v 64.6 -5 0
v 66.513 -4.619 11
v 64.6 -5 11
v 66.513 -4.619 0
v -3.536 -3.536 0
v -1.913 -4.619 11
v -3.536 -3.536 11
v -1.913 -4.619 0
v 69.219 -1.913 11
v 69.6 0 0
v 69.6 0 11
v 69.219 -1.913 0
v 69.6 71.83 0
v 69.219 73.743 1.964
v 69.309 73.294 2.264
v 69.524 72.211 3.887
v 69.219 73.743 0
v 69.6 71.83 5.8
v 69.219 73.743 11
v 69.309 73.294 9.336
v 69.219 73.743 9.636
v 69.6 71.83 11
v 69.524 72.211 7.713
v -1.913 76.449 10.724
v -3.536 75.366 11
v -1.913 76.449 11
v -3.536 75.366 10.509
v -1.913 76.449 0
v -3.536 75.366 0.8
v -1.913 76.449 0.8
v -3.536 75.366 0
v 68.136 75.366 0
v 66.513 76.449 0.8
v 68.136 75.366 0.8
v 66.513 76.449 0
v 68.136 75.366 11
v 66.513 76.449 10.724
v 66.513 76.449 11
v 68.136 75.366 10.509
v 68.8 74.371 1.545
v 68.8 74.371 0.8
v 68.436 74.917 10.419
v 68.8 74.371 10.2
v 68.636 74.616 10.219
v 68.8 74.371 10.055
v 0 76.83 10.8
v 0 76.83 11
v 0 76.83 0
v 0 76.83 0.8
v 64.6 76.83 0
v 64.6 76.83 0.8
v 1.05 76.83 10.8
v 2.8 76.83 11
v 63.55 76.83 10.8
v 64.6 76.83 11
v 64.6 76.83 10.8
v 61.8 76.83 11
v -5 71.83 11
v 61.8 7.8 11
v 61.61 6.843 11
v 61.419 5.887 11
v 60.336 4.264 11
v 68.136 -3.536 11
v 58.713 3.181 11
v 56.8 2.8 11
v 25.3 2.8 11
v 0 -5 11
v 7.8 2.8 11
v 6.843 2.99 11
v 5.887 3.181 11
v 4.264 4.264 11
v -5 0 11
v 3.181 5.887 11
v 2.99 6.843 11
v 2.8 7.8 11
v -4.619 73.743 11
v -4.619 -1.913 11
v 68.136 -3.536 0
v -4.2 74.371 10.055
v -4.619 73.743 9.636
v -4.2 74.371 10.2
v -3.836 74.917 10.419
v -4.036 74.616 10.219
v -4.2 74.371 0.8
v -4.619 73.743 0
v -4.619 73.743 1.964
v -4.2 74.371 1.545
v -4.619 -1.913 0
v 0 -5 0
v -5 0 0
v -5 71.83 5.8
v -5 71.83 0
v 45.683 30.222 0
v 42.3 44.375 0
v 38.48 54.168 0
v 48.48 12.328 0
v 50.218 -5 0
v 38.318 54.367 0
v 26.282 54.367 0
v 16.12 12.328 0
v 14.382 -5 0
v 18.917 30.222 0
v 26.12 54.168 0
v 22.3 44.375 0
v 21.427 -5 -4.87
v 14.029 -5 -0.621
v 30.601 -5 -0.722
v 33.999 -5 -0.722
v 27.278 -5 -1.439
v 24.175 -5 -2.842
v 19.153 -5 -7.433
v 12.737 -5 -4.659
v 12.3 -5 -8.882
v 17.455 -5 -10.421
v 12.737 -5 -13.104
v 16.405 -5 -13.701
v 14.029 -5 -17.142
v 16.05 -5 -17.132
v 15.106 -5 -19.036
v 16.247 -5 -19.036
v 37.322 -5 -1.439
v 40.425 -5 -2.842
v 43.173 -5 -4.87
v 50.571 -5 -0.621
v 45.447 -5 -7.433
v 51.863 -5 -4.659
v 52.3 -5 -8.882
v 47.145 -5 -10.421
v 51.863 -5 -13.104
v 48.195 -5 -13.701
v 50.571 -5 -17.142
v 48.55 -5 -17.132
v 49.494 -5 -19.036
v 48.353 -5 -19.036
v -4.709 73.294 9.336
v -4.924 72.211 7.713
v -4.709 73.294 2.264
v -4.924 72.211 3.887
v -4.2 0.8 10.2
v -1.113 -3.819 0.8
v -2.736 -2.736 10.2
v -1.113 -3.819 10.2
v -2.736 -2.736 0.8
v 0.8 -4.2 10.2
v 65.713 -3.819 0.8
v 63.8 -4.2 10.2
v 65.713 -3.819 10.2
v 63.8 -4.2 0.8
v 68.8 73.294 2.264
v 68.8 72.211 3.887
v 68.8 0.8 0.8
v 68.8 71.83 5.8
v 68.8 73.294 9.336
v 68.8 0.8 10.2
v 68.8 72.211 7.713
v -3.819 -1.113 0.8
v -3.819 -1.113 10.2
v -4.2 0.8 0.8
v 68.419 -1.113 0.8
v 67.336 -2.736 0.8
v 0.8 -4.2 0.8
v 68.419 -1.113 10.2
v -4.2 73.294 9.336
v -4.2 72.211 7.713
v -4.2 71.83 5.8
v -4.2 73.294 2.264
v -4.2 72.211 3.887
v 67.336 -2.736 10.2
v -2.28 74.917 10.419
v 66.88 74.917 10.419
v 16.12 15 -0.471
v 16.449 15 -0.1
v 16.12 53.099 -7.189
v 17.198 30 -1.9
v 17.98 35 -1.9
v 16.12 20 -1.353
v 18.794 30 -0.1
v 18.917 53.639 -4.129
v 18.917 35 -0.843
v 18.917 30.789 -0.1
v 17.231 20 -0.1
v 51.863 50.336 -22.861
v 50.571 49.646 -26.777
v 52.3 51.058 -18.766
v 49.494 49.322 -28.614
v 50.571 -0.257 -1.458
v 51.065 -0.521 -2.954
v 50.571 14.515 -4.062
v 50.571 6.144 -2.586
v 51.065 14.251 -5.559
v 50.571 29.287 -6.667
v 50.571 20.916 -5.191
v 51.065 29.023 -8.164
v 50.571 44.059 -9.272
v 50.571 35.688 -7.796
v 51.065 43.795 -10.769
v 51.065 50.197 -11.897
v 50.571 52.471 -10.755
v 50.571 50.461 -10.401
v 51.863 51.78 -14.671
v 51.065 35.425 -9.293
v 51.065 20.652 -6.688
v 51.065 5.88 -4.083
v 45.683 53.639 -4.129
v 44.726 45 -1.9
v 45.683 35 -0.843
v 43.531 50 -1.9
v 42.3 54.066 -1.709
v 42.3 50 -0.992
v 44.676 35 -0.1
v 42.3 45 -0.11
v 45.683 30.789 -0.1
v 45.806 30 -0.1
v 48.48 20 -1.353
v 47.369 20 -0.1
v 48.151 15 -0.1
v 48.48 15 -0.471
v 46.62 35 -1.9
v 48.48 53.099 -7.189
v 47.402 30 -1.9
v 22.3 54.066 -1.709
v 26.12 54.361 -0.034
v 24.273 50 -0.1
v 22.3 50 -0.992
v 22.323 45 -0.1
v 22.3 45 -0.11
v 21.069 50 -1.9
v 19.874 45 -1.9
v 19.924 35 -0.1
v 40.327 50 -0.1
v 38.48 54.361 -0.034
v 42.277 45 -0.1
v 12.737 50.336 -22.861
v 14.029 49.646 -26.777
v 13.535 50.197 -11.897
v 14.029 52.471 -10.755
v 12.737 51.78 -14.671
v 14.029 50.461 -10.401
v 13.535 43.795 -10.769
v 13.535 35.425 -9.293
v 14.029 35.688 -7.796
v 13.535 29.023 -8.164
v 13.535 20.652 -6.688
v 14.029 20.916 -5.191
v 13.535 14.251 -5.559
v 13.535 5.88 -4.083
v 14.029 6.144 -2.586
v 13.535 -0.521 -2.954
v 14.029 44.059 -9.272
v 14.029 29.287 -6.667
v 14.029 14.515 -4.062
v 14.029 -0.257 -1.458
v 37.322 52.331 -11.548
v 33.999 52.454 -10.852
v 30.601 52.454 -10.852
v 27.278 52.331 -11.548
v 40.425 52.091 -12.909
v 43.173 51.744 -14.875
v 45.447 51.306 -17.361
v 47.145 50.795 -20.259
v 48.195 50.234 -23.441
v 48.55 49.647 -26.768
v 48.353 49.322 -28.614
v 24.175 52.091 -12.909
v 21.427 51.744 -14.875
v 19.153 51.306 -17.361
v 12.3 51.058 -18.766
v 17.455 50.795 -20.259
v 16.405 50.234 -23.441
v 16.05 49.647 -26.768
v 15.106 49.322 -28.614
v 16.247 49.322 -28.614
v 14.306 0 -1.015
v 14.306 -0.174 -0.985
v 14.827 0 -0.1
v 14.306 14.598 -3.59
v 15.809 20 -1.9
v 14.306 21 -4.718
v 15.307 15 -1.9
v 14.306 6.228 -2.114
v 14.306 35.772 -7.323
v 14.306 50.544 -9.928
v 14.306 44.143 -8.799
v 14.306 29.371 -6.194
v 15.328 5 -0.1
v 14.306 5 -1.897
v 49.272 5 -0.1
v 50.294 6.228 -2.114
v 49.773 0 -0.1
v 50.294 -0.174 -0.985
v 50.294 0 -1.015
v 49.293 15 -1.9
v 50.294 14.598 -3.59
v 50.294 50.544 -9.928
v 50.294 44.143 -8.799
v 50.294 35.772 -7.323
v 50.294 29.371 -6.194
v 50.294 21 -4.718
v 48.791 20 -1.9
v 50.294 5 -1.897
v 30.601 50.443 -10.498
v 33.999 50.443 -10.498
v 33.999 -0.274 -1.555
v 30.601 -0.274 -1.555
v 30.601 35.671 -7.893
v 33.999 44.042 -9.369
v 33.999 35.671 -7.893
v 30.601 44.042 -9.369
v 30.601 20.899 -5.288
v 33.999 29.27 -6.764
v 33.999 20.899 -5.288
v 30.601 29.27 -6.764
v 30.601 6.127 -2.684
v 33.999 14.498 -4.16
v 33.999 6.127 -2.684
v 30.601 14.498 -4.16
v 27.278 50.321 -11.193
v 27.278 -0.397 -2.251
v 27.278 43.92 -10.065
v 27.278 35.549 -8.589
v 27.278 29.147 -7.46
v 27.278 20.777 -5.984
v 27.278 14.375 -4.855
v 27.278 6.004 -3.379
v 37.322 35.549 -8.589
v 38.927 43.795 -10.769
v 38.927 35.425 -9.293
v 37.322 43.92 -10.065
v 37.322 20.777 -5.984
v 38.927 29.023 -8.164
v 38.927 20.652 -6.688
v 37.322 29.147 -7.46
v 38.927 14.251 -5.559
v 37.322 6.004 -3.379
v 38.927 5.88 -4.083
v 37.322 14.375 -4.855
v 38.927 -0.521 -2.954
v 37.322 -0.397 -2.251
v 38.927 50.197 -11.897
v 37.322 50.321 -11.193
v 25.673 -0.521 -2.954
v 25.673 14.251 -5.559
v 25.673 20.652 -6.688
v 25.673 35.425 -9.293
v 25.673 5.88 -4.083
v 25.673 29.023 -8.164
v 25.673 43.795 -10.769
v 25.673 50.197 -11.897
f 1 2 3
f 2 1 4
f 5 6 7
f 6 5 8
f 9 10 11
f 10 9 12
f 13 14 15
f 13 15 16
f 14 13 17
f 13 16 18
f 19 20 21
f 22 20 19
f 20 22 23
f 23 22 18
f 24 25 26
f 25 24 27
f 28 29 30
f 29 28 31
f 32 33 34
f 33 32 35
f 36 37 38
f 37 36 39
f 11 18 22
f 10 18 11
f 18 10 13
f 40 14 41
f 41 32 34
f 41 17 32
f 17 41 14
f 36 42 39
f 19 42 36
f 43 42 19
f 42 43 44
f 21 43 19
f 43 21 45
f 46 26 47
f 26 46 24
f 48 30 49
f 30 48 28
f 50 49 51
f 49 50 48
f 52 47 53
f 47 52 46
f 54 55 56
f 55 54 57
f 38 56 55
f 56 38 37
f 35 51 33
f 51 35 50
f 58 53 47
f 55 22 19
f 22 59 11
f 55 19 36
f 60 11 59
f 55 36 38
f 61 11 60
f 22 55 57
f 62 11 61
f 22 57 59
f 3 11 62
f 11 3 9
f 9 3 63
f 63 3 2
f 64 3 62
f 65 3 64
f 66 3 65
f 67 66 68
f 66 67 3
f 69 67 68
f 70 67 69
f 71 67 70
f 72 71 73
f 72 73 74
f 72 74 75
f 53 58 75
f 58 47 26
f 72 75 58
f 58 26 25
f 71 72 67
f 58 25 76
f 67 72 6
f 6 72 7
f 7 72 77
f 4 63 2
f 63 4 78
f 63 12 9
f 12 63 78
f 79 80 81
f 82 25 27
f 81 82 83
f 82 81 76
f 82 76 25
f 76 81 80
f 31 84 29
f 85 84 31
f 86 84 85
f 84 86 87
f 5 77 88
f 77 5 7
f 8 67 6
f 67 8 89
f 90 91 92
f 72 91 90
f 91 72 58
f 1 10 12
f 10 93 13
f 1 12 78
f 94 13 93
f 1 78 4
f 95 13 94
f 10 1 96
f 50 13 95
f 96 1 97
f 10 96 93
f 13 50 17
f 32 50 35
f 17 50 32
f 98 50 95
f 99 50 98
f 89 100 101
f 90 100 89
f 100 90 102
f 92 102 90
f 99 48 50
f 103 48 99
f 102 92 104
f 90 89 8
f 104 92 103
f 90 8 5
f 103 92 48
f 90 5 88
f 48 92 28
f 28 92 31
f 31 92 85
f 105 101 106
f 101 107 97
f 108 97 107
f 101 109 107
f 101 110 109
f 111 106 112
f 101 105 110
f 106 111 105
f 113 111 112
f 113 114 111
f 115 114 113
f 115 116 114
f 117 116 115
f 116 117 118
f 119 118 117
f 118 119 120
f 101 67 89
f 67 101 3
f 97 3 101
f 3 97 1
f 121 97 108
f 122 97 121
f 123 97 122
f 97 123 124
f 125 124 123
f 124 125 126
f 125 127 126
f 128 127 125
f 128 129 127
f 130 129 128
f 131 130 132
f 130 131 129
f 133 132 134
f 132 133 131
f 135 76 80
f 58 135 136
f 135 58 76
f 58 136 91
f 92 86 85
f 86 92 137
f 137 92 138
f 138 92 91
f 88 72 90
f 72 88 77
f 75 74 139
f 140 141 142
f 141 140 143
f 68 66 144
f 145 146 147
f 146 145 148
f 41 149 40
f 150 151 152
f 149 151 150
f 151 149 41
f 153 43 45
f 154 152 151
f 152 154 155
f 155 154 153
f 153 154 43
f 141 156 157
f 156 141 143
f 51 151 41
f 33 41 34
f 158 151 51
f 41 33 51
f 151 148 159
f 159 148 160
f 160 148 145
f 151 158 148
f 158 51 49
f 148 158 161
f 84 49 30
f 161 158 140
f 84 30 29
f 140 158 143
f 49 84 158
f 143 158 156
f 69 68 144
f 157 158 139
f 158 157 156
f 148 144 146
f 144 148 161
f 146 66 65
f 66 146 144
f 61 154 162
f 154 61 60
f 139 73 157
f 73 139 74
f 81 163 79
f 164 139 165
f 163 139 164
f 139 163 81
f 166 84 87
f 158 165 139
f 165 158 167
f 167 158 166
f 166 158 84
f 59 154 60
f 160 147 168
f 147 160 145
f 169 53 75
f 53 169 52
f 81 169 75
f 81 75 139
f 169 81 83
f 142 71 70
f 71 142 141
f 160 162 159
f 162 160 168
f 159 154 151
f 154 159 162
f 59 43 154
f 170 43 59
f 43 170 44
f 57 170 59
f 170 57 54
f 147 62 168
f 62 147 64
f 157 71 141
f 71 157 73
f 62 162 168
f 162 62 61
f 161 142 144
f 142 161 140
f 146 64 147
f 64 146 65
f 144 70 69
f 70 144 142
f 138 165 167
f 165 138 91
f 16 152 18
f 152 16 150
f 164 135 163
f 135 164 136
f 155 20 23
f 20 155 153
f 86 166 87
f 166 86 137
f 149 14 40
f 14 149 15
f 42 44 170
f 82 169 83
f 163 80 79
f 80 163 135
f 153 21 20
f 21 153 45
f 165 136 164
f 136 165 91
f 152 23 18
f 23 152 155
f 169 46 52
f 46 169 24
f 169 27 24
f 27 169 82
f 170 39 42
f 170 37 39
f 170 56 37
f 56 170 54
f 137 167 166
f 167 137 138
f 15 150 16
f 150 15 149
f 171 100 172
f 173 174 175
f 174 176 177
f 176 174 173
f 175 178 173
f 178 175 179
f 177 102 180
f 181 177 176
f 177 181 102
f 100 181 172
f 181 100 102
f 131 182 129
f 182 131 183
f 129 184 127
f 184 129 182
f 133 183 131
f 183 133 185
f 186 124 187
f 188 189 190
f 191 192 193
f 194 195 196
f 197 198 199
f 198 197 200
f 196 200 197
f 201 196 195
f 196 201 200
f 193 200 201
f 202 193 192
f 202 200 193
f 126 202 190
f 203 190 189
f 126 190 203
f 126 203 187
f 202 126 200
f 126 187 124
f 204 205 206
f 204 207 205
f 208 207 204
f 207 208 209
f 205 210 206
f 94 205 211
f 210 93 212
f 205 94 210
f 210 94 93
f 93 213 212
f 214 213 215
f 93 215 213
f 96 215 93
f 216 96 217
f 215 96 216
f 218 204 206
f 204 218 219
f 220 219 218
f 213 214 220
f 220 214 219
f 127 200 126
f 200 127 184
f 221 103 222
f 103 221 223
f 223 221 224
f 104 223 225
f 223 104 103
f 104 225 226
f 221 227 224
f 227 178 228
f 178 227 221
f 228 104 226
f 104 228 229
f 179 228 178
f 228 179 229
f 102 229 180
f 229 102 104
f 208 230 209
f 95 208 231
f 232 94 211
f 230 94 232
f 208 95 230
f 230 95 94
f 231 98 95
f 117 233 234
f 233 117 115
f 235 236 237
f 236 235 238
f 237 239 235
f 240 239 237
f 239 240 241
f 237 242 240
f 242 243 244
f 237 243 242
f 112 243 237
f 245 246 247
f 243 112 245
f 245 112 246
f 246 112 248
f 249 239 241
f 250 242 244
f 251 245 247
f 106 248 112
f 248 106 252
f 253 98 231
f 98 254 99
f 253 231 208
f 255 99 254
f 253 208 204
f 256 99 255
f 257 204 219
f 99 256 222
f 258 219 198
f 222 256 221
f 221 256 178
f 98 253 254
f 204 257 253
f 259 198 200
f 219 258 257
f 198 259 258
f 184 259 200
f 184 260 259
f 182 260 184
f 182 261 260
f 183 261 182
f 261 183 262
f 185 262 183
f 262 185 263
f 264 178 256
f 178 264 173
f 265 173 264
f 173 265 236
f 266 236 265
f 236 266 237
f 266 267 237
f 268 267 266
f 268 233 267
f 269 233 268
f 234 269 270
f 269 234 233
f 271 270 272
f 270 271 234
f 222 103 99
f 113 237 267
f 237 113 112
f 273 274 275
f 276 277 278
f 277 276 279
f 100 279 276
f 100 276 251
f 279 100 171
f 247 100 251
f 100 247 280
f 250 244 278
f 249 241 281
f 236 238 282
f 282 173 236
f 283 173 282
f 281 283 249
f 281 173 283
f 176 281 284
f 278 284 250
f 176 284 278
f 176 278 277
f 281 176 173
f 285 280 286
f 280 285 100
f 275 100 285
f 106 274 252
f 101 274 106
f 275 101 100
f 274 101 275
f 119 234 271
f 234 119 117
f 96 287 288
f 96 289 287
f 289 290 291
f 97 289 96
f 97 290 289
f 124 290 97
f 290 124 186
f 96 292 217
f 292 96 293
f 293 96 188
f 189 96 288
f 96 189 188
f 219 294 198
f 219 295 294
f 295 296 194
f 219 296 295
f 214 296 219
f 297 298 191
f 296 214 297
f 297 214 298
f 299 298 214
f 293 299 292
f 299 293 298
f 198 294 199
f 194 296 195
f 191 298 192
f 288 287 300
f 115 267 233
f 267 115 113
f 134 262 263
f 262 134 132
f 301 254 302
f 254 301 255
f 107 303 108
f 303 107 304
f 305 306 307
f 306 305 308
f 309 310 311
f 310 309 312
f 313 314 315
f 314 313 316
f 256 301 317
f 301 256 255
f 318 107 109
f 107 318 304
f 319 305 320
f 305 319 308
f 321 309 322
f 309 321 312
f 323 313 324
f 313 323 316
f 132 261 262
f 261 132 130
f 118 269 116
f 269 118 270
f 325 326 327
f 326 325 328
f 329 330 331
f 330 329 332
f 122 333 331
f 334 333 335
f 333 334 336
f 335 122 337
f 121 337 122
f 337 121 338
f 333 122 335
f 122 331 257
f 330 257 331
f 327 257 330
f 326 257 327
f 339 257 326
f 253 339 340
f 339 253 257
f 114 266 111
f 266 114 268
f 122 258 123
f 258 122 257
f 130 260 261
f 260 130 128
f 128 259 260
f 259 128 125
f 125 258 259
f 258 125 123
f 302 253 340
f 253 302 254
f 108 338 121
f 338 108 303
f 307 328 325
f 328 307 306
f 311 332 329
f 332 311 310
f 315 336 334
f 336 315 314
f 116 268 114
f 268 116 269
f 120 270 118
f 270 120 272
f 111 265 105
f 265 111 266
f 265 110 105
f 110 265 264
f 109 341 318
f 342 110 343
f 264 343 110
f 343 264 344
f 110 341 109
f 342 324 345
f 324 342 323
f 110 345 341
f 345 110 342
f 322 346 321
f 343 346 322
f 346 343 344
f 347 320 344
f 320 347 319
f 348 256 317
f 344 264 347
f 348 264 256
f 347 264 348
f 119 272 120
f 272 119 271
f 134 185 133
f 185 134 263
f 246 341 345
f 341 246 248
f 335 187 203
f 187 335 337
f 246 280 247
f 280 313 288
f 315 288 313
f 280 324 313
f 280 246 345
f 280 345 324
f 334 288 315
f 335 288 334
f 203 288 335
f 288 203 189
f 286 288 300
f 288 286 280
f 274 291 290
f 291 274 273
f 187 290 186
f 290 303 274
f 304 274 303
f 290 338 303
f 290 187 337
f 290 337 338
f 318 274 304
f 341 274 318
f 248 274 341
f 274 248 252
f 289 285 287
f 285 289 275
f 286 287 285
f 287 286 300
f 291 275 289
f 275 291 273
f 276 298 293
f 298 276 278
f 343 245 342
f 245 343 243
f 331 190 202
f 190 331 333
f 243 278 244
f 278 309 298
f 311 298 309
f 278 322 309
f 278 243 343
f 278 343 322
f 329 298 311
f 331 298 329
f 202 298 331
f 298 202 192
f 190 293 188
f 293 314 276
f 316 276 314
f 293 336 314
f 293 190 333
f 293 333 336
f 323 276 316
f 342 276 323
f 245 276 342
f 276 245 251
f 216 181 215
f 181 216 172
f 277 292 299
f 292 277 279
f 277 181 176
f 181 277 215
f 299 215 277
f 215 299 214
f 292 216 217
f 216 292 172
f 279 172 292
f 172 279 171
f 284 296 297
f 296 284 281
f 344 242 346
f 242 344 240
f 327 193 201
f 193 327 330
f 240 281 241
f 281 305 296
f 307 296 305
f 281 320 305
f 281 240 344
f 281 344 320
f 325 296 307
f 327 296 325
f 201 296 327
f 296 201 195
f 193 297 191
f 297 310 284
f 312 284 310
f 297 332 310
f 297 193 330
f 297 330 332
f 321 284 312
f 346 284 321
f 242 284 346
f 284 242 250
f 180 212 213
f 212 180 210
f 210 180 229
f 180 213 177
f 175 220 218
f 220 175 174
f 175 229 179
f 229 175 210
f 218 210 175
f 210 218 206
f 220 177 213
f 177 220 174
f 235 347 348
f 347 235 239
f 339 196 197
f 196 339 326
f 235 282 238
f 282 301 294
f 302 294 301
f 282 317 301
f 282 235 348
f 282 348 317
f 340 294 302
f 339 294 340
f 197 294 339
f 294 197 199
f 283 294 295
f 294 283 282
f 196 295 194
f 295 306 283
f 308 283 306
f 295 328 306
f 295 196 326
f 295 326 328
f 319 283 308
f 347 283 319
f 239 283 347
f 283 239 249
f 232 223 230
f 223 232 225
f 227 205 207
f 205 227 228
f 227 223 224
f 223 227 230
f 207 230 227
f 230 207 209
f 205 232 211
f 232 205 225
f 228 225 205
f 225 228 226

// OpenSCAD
/* $fn = 50; */
inner_width = 73;
inner_height = 139;
rad = 5;
thickness = 0.8;
depth = 11;
width = inner_width + (thickness * 2) - (2 * rad);
height = inner_height + (thickness * 2) - (2 * rad);
buttons_hole = 42;
buttons_hole_w = 6;
rant = 7;
over = 70;
buttons_h = 74;


mount_angle = 10;
inner_mount = 16.25;
outer_mount = 20;
mount_length = 62;

module baseblock(w=55, h=96, r=5, t=9) {
  hull() {
    cylinder(t, r=r);
    translate([w, 0, 0]) {
      translate([0, h, 0]) cylinder(t, r=r);
      cylinder(t, r=r);
      cylinder(t, r=r);
    }
    translate([0, h, 0]) cylinder(t, r=r);
  }
}



module phonecase_short() {
  short_height = height * 0.55;
  rrant = rant * 2;
  hrant = rant;
  difference() {
    baseblock(w=width, h=short_height, t=depth);
    hull() {
      translate([thickness, thickness, thickness])
        baseblock(w=width - (thickness * 2), h=short_height * 2, t=depth - (thickness * 2));
      translate([thickness + rrant, thickness + rrant, thickness])
        baseblock(w=width - ((thickness + rrant) * 2), h=short_height - (thickness * 2), t=depth);
    }
    translate([width * 1.5, short_height+rad, rad+thickness])
      rotate(-90, [0, 1, 0])
        cylinder(width * 2, r=rad);
    translate([thickness + hrant, thickness + rrant + over, -thickness])
        baseblock(w=width - ((thickness + hrant) * 2), h=short_height - (thickness * 2), t=depth);
  }
}

module phonecase() {
  rrant = rant * 2;
  hrant = rant;
  difference() {
    baseblock(w=width, h=height, t=depth);
    hull() {
      translate([thickness, thickness, thickness])
        baseblock(w=width - (thickness * 2), h=height - thickness, t=depth - (thickness * 2));
      translate([thickness + rrant, thickness + rrant, thickness])
        baseblock(w=width - ((thickness + rrant) * 2), h=height - (thickness * 2), t=depth);
    }
    translate([thickness + hrant, thickness + rrant + over, -thickness])
        baseblock(w=width - ((thickness + hrant) * 2), h=height - (thickness * 2), t=depth);
    translate([width + rad - (thickness * 1.5), buttons_h, (depth - buttons_hole_w) / 2])
      cube([thickness*2, buttons_hole, buttons_hole_w]);
  }
}

module bikemount() {
    rotate(-90 - mount_angle, [1, 0, 0])
      intersection() {
        translate([-outer_mount, -outer_mount - (outer_mount / 2), -thickness / 2])
          cube([outer_mount * 2, outer_mount * 2, mount_length + thickness]);

        difference() {
          cylinder(mount_length, r=outer_mount);
          translate([0, inner_mount / 2, -thickness])
            cylinder(mount_length + (thickness * 2), r=inner_mount);
        }
      }
}

module mount_holes() {
  space = 15;
  for (shift = [0 : space : mount_length - (space + thickness)]) {
    rotate(-mount_angle, [1, 0, 0])
      translate([0,shift,-3])
        cube([width,6.5,2]); // 6mm stepper belt (for the grip)
    translate([0,shift,-1.9])
      cube([width,5,1.8]); // zip tie
  }
}

difference() {
  union() {
    /* phonecase(); */
    phonecase_short();
    translate([0, -2*rad, 0])
      intersection() {
        translate([width / 2, 0, -8])
          bikemount();
        translate([0, rad, - 2 * outer_mount])
            cube([width, mount_length, outer_mount * 2]);
      }
  }
  mount_holes();
}
